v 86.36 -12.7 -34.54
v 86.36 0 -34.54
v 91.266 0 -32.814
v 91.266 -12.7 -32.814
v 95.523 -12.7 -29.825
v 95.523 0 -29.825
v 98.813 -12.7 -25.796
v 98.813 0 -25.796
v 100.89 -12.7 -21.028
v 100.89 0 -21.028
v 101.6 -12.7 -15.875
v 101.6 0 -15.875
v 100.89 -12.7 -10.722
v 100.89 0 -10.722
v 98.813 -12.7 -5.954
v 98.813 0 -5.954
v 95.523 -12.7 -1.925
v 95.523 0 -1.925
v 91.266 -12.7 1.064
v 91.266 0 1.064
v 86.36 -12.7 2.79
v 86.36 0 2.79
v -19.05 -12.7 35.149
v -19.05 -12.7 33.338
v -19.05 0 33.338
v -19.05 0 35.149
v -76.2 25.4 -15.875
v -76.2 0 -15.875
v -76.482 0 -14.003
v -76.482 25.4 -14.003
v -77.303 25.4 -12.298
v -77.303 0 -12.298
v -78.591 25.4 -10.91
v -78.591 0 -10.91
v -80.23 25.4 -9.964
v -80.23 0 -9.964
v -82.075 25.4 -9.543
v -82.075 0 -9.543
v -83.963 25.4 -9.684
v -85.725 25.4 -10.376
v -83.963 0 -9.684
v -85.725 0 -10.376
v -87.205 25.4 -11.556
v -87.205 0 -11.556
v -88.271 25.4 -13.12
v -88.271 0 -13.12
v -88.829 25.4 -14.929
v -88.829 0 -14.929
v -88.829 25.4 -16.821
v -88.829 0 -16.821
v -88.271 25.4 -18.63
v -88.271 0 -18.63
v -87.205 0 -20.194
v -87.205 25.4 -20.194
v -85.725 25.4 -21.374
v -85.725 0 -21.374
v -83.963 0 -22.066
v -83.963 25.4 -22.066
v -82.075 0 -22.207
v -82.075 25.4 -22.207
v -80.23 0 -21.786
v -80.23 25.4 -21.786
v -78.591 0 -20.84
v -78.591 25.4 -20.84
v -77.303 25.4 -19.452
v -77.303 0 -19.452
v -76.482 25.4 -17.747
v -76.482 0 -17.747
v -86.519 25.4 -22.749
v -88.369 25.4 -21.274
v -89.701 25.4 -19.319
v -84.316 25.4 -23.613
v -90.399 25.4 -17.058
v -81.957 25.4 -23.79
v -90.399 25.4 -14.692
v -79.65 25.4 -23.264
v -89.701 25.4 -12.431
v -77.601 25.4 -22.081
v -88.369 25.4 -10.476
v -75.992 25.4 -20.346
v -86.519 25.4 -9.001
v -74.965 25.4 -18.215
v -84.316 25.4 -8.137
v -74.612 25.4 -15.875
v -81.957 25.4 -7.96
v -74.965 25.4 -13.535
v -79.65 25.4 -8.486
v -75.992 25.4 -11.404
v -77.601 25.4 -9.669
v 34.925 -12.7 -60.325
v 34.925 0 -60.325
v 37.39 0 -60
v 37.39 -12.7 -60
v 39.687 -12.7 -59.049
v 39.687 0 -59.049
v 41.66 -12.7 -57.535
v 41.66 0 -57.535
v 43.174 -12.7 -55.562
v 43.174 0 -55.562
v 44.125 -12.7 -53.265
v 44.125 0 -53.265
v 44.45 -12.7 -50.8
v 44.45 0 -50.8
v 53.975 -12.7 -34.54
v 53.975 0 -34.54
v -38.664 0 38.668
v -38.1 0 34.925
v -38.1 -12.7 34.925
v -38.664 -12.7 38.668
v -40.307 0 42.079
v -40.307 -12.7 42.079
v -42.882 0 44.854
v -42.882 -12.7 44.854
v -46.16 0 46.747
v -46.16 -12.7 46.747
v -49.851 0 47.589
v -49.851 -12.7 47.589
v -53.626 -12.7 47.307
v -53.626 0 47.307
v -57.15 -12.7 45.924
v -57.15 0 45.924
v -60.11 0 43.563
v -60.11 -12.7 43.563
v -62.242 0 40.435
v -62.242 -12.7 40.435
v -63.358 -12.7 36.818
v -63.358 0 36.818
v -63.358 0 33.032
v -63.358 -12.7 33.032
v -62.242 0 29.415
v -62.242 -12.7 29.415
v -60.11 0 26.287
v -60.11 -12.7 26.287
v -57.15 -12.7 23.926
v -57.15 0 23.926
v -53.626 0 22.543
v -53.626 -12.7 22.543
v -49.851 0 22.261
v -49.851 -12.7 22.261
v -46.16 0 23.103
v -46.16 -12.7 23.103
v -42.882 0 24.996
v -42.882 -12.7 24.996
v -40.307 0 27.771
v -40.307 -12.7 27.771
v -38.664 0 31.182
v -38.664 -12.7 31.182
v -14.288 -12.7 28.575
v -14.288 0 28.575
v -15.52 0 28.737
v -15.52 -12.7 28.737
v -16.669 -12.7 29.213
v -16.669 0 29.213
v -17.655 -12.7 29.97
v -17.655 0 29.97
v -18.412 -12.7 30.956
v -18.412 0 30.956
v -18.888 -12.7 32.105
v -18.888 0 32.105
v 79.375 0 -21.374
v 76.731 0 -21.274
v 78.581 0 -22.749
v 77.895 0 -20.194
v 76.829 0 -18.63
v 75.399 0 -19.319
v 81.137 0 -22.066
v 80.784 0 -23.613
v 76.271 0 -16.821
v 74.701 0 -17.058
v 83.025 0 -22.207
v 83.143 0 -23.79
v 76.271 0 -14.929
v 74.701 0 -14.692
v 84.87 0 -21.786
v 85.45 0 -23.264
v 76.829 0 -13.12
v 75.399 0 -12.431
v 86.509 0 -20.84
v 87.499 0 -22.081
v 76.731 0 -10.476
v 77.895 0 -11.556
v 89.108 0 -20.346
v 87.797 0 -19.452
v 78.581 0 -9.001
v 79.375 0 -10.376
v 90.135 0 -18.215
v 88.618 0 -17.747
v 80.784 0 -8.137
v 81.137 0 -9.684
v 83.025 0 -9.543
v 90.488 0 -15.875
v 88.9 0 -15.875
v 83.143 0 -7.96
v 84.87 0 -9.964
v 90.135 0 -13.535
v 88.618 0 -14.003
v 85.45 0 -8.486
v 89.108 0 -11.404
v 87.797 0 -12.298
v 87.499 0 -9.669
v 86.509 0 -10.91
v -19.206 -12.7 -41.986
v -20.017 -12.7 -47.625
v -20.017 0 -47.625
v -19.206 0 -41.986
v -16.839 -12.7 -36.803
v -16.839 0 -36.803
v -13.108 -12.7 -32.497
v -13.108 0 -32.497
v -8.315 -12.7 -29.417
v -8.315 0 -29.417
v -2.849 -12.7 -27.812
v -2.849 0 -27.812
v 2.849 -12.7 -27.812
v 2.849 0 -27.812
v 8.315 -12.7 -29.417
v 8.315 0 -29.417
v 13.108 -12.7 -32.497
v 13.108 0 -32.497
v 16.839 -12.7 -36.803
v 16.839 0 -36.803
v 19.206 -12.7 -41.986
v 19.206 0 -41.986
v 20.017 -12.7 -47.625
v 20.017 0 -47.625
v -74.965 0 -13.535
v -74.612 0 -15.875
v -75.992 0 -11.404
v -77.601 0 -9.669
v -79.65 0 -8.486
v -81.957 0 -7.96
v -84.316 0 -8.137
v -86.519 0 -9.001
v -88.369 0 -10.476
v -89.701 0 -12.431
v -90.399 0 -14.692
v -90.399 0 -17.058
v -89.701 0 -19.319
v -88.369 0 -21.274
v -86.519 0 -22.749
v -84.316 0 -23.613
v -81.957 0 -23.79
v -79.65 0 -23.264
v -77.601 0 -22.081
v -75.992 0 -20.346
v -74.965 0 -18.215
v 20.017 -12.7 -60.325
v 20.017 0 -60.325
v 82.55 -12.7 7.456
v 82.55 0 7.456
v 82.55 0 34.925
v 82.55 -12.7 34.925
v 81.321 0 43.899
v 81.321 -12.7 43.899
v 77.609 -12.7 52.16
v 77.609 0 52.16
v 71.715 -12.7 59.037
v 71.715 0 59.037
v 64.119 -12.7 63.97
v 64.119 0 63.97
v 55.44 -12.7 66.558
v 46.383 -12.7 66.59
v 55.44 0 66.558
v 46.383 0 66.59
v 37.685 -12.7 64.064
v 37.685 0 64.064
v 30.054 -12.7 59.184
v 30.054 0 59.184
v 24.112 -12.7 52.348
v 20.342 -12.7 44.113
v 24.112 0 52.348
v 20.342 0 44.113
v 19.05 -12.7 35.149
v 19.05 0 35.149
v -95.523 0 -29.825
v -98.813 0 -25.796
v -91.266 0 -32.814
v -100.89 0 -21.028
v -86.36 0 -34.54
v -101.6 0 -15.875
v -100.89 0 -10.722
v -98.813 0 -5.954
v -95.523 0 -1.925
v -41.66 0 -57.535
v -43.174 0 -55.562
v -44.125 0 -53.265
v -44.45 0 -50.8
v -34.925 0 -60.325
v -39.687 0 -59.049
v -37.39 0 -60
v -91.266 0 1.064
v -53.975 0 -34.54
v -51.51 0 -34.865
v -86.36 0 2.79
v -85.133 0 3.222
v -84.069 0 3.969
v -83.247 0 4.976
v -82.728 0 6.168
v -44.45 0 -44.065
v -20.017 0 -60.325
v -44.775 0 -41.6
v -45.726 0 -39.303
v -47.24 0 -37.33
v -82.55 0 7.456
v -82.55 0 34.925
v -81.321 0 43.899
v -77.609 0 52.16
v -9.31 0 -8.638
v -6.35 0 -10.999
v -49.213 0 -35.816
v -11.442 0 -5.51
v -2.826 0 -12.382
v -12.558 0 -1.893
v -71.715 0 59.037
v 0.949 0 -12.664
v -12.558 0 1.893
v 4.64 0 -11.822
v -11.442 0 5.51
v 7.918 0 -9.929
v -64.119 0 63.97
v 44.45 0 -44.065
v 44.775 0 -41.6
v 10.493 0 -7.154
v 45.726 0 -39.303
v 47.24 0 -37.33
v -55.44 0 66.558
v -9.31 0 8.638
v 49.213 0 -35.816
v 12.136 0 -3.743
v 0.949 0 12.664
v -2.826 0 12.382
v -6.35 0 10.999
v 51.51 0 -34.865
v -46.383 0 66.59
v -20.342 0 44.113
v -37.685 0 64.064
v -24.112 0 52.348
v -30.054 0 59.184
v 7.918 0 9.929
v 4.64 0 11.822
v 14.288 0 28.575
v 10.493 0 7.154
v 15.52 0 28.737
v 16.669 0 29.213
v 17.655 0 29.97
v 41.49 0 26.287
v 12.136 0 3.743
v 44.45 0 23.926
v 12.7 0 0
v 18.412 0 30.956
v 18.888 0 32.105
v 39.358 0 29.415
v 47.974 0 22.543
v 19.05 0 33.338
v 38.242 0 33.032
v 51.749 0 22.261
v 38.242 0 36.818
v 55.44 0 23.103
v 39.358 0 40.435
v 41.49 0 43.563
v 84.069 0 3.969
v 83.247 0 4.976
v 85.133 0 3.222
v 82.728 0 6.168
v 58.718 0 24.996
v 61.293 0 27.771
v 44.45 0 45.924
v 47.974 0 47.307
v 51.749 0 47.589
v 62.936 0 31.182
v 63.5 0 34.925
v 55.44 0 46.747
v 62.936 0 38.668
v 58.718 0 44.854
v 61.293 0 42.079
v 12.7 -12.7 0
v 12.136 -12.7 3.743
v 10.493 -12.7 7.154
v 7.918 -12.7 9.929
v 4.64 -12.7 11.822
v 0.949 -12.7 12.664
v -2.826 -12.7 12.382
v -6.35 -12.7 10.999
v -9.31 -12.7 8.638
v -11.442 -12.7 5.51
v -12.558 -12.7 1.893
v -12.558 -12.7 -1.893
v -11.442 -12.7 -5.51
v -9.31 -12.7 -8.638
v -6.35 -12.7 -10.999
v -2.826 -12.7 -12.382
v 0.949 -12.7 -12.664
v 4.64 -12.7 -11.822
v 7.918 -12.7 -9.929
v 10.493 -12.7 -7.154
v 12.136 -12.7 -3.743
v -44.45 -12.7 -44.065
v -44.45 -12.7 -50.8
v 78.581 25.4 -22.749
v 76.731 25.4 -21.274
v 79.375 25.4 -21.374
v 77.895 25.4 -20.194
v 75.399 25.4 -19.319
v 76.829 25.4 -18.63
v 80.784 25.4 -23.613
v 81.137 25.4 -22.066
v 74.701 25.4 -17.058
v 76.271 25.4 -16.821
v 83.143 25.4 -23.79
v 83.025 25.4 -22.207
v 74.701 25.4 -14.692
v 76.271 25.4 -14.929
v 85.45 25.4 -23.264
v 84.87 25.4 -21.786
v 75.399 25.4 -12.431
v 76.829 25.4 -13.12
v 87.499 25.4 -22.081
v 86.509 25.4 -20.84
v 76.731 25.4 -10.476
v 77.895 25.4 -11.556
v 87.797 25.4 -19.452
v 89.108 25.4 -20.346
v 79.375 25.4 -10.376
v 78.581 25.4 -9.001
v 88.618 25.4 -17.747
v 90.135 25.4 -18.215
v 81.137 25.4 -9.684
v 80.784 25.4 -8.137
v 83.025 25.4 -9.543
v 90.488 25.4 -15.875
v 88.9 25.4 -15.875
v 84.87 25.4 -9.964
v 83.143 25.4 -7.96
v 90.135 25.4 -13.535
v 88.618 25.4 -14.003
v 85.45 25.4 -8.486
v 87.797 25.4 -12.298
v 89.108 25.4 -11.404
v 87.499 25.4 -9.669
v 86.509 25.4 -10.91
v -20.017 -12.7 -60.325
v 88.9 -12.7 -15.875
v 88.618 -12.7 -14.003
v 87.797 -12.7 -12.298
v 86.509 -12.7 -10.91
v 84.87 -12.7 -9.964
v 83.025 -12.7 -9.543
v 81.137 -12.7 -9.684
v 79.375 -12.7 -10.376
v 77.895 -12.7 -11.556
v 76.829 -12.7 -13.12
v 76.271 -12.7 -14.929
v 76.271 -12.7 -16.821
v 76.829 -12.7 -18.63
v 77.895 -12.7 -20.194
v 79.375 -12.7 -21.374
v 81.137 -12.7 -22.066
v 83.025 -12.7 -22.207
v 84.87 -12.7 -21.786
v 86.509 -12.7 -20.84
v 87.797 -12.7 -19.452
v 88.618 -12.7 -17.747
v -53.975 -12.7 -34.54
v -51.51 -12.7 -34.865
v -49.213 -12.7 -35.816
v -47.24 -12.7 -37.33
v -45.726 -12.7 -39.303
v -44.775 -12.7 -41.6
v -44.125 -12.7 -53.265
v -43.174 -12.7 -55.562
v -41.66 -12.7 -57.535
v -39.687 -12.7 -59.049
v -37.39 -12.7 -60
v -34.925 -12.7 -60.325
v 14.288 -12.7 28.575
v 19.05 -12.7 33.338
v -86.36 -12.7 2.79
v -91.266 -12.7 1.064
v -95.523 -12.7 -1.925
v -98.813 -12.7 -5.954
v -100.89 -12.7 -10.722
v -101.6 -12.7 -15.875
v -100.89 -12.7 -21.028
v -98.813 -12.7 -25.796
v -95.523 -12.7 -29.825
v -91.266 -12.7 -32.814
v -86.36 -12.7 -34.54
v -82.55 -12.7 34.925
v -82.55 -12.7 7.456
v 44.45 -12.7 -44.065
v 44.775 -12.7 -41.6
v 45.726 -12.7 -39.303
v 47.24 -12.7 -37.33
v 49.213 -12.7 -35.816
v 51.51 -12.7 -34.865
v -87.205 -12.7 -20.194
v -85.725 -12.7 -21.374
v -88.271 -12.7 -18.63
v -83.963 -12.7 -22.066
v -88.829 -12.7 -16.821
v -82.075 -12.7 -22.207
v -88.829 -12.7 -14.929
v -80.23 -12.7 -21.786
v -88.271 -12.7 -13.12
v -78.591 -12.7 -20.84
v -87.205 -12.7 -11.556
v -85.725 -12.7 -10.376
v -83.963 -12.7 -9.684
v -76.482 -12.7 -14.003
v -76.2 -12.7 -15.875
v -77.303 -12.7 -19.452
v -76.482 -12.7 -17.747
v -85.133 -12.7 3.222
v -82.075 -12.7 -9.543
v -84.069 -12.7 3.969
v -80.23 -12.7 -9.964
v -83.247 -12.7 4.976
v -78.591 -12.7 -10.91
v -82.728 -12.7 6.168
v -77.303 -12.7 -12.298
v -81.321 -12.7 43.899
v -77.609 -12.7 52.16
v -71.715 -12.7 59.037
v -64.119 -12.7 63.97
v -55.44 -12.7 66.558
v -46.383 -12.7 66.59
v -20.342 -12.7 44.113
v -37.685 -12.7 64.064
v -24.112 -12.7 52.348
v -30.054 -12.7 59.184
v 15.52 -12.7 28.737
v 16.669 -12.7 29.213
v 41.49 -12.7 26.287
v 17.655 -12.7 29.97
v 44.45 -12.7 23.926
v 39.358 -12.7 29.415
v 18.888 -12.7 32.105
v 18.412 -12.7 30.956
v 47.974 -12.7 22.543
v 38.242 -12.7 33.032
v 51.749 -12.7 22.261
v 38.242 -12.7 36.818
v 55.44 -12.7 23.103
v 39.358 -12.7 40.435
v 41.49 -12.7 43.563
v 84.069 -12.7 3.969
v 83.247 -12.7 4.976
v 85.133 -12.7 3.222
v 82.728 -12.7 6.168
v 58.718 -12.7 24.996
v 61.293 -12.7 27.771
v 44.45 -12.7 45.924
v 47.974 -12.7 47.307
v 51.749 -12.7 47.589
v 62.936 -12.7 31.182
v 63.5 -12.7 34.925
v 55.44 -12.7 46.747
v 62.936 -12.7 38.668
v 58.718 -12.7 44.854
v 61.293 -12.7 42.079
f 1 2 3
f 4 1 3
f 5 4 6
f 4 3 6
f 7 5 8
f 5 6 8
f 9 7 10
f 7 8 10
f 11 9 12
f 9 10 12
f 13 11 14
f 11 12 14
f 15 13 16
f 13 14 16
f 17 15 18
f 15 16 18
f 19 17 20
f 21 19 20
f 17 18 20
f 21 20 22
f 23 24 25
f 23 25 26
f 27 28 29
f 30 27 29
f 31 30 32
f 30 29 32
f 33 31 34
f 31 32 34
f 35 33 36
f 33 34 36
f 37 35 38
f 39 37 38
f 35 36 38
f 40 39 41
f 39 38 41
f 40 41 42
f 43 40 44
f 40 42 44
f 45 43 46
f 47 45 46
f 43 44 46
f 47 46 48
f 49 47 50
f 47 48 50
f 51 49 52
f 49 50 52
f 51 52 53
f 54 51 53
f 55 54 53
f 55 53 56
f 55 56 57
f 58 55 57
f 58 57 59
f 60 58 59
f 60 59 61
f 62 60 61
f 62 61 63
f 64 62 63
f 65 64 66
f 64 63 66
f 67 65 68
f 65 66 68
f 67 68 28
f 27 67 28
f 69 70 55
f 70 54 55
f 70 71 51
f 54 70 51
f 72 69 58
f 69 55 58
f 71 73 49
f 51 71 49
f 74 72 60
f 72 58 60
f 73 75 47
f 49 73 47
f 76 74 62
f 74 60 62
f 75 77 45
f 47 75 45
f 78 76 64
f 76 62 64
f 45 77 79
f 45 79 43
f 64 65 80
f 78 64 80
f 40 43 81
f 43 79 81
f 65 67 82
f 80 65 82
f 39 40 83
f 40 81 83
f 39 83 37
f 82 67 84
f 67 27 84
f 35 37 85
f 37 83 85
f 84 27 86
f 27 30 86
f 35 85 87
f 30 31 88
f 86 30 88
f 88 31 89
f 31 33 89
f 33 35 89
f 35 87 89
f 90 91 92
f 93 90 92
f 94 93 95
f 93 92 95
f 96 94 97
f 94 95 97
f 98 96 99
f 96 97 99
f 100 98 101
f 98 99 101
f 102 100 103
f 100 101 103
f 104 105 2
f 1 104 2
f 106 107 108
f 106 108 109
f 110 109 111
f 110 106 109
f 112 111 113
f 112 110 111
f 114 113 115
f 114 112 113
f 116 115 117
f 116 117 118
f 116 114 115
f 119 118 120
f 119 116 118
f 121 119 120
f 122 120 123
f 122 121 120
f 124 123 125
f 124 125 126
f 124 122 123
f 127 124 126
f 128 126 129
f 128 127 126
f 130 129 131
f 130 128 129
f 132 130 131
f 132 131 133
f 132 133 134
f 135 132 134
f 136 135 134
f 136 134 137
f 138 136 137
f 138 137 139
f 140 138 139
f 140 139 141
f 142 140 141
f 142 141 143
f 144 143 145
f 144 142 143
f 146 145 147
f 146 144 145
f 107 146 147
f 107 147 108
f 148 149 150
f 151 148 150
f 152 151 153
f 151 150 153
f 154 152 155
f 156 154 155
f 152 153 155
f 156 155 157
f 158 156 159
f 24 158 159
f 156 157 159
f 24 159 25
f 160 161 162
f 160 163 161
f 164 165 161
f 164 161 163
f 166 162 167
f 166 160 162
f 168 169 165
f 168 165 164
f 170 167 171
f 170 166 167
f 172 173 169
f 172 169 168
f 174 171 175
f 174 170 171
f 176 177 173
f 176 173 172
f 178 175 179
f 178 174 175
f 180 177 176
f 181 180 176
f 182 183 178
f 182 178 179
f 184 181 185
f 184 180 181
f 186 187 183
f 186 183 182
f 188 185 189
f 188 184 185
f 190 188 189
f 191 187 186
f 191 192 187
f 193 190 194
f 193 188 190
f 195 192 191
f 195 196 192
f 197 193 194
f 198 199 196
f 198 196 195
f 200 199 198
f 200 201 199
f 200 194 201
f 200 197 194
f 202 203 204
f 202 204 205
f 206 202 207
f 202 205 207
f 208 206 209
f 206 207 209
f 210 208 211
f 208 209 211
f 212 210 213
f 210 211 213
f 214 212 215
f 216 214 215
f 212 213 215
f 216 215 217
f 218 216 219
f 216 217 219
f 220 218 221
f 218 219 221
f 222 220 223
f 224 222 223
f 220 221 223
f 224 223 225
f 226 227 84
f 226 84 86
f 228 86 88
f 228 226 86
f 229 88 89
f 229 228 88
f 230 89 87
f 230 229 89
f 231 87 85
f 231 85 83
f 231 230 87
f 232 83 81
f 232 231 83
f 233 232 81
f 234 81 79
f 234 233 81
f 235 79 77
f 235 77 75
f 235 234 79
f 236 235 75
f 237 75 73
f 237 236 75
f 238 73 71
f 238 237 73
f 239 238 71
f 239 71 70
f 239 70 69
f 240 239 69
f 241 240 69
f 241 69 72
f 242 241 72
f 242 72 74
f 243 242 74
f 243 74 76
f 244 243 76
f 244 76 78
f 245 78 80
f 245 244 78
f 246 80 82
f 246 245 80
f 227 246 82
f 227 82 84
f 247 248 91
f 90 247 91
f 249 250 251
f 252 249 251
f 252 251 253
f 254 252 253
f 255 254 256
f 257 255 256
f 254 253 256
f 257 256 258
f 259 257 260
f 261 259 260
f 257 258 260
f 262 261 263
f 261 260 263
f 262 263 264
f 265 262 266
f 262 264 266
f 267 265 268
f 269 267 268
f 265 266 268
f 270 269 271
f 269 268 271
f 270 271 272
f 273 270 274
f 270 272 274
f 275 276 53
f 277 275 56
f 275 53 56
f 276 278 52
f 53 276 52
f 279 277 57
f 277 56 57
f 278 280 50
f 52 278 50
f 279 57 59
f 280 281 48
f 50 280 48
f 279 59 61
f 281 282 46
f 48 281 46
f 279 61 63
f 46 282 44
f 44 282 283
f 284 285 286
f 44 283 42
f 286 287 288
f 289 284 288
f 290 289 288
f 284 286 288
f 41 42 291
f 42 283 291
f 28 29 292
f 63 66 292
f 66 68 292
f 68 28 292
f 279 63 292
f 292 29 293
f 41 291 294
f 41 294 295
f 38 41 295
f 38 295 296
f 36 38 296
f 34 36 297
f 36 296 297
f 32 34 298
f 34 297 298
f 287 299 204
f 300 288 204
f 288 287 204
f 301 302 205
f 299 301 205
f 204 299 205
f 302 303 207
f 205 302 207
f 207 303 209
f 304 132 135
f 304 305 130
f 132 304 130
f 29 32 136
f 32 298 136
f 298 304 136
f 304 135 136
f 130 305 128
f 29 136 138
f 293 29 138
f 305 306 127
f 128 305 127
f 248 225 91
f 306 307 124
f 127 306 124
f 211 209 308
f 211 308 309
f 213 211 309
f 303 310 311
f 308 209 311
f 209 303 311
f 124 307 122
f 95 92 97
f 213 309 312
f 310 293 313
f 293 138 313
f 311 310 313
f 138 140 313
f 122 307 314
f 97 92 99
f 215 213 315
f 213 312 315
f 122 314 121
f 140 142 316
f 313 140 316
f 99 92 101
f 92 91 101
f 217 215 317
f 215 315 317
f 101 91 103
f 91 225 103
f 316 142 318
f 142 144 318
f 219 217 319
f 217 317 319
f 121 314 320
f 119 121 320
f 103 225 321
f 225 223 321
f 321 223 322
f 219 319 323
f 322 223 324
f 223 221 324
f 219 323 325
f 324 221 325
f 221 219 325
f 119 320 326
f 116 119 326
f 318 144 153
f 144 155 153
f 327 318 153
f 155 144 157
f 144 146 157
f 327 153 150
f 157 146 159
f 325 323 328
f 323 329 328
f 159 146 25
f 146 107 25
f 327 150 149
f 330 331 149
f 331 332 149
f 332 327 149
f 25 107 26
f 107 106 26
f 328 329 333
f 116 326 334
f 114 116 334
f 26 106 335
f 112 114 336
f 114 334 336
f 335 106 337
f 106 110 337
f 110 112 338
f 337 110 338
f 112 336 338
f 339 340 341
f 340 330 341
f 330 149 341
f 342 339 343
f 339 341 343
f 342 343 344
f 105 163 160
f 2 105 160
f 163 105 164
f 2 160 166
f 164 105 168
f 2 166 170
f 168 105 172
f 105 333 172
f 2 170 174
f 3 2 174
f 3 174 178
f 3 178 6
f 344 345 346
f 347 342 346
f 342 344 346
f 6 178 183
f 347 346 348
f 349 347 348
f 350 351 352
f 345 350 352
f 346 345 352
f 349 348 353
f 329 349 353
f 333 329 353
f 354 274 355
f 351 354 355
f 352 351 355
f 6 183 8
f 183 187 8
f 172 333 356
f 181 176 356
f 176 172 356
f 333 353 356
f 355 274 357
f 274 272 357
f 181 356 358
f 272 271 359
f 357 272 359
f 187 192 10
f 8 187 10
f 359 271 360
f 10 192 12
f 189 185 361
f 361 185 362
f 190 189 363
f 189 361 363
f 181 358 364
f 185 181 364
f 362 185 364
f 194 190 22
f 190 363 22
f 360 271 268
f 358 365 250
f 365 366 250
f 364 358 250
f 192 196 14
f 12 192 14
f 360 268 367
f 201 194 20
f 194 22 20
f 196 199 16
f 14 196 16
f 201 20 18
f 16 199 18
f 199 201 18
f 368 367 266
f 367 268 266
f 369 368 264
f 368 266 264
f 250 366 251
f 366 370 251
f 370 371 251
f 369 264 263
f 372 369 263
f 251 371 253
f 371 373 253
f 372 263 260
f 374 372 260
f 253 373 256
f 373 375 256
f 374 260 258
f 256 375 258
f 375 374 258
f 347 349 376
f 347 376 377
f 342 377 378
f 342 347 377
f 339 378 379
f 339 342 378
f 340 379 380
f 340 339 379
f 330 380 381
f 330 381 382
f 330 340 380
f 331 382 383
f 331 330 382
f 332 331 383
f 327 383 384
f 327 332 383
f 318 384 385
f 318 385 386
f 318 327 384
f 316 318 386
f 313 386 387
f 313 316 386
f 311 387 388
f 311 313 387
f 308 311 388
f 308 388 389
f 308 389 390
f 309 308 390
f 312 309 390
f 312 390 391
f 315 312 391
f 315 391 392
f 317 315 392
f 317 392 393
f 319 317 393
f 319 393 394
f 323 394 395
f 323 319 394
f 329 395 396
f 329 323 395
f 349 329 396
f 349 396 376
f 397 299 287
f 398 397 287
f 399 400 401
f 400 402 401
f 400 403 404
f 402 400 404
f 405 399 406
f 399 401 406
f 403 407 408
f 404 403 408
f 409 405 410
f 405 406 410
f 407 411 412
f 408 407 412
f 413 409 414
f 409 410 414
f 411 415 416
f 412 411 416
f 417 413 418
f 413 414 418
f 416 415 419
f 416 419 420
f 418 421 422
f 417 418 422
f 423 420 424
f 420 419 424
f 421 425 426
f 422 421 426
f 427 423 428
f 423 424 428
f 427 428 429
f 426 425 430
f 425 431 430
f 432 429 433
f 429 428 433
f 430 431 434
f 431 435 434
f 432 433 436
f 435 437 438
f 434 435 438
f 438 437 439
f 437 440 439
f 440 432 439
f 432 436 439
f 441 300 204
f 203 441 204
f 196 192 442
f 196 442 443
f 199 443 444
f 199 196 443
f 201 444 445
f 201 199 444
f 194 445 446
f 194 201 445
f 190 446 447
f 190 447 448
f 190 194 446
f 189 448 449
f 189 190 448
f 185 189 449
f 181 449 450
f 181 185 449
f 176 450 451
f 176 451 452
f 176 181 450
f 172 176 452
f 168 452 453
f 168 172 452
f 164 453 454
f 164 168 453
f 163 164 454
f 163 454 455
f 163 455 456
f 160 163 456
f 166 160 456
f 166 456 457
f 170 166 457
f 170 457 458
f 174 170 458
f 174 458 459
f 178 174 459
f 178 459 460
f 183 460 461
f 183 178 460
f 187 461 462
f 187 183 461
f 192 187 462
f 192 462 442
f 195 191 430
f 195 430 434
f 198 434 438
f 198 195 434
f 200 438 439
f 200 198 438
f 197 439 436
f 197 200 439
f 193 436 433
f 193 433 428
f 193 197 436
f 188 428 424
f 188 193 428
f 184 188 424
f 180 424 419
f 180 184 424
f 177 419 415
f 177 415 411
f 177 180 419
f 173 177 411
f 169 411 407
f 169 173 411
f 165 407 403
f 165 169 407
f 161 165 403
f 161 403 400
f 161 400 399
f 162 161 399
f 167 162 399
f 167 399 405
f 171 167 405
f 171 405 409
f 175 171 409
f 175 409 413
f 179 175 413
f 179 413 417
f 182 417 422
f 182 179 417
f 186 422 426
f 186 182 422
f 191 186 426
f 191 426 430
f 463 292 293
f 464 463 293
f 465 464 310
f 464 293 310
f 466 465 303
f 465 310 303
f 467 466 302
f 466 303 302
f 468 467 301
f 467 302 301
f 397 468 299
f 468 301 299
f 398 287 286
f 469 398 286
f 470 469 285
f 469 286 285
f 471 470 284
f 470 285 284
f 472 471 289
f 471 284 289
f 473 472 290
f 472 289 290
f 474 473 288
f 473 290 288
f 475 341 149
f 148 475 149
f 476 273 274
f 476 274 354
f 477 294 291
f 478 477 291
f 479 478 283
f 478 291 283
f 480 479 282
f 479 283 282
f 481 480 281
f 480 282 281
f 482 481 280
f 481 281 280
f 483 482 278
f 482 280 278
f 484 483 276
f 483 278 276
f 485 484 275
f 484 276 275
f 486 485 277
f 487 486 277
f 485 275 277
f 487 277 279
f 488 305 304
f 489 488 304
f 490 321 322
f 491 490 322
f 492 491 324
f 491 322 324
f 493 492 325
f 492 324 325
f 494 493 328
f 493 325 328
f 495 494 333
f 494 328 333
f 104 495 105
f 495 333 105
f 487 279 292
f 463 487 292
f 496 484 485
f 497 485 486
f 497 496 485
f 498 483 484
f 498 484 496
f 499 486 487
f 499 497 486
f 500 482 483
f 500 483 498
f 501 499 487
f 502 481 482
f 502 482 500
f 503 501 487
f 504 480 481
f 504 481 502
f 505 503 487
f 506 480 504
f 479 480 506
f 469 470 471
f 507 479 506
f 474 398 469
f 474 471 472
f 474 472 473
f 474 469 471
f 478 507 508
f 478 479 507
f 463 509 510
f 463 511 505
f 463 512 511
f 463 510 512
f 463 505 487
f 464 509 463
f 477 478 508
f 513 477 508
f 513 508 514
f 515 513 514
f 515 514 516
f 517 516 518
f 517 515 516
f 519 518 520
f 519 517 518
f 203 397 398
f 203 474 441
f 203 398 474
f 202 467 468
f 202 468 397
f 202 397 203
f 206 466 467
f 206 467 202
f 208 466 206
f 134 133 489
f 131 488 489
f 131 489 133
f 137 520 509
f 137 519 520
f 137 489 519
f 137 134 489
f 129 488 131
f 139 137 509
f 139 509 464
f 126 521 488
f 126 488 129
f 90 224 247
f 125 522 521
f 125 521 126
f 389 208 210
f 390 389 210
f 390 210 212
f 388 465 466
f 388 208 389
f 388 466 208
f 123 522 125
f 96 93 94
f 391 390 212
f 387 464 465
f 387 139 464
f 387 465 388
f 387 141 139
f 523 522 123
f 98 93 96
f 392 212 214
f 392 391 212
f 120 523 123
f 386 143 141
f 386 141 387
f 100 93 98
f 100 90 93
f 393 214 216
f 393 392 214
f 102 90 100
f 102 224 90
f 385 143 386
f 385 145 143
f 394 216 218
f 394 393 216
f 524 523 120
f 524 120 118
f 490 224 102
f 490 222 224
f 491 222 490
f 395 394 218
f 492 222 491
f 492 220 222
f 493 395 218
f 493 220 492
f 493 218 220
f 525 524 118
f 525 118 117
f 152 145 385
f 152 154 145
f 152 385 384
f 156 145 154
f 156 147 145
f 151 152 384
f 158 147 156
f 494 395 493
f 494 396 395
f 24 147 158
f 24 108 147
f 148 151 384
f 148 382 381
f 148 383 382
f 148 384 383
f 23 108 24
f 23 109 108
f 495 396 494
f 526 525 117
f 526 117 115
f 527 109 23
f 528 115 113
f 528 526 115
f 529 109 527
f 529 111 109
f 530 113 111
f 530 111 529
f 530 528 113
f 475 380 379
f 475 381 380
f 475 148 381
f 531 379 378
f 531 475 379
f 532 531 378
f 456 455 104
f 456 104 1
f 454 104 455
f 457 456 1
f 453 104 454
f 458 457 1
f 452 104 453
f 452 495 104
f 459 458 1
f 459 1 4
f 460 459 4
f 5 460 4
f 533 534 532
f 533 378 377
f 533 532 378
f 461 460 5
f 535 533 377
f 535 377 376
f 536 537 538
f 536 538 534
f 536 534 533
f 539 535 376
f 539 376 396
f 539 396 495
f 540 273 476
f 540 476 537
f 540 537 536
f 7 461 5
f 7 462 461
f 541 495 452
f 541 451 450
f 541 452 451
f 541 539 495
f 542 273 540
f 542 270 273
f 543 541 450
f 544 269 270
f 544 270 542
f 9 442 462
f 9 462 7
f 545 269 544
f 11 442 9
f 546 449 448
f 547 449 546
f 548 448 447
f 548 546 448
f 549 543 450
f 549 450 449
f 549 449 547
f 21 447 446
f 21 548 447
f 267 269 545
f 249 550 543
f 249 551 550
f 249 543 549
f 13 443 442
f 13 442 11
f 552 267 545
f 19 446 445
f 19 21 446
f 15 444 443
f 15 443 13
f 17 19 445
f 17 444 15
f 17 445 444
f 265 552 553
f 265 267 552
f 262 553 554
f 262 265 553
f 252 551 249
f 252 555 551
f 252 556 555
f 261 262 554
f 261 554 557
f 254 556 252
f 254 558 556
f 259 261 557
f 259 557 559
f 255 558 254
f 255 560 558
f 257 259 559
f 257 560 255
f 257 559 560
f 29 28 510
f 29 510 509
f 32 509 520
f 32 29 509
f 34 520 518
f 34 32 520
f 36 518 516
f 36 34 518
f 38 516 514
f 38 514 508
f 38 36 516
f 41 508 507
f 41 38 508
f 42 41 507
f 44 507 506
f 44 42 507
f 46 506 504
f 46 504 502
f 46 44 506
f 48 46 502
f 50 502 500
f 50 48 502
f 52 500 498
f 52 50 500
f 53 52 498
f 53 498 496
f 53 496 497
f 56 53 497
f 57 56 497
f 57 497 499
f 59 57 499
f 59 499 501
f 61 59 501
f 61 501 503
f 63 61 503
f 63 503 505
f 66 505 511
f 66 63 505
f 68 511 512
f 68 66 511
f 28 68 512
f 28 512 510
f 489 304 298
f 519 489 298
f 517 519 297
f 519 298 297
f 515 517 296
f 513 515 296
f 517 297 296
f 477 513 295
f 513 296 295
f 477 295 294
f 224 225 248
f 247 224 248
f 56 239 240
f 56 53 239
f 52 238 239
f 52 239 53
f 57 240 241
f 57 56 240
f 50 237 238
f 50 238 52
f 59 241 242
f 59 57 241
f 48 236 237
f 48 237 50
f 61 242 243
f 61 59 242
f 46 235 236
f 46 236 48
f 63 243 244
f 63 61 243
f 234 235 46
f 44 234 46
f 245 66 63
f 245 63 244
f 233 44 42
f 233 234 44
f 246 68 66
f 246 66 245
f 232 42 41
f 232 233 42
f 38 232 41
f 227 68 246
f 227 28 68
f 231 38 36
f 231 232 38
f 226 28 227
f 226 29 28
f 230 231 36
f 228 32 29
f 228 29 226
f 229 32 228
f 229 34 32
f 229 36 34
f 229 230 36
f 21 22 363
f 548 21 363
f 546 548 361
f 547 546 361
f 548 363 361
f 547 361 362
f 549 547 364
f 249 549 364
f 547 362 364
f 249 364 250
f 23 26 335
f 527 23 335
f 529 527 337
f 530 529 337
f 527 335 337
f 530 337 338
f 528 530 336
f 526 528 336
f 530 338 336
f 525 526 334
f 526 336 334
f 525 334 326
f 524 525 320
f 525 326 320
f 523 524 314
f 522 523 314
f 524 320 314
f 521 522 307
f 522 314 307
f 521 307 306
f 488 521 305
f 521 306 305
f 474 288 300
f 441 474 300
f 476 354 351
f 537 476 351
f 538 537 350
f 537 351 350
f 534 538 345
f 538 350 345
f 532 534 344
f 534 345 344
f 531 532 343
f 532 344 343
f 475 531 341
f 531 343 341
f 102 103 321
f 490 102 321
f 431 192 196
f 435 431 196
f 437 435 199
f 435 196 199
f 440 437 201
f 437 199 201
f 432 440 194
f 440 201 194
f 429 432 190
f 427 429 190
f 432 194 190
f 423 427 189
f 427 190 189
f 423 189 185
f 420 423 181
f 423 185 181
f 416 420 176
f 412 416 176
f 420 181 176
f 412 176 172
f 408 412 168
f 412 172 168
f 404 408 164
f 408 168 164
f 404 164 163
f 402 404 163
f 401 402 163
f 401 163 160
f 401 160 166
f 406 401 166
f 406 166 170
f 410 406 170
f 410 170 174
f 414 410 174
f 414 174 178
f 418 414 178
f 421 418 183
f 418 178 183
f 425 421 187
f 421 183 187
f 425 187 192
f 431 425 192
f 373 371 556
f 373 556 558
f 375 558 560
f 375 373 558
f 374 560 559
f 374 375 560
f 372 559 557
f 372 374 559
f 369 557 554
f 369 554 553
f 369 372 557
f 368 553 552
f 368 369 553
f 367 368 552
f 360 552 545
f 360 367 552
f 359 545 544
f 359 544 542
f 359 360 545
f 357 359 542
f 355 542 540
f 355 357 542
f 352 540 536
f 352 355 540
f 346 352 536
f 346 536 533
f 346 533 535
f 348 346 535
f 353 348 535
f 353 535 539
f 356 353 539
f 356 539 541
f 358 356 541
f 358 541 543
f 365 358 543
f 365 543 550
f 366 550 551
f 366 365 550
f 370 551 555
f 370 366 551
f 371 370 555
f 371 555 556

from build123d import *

# Parameters (mm, degrees)
F0_R     = 7.9375
F0_R_2   = 12.7
F0_R_3   = 6.35
F1_DEPTH = 12.7
F2_DEPTH = 25.4


with BuildPart() as f1:
    # F0 (on Front) → F1 (new body)
    with BuildSketch(Plane.XZ):
        with BuildLine():
            Line((14.2875, 28.575), (-14.2875, 28.575))
            ThreePointArc((-14.2875, 28.575), (-17.655096, 29.969904), (-19.05, 33.3375))
            Line((-19.05, 33.3375), (-19.05, 35.148678))
            ThreePointArc((-19.05, 35.148678), (-50.912234, 66.898875), (-82.55, 34.925))
            Line((-82.55, 34.925), (-82.55, 7.45639))
            ThreePointArc((-82.55, 7.45639), (-83.623483, 4.44432), (-86.36, 2.790112))
            ThreePointArc((-86.36, 2.790112), (-101.6, -15.875), (-86.36, -34.540112))
            Line((-86.36, -34.540112), (-82.55, -34.540112))
            Line((-82.55, -34.540112), (-53.975, -34.540112))
            ThreePointArc((-53.975, -34.540112), (-47.239808, -37.32992), (-44.45, -44.065112))
            Line((-44.45, -44.065112), (-44.45, -50.8))
            ThreePointArc((-44.45, -50.8), (-41.660192, -57.535192), (-34.925, -60.325))
            Line((-34.925, -60.325), (-20.016928, -60.325))
            Line((-20.016928, -60.325), (-20.016928, -47.625))
            ThreePointArc((-20.016928, -47.625), (0, -27.608072), (20.016928, -47.625))
            Line((20.016928, -47.625), (20.016928, -60.325))
            Line((20.016928, -60.325), (34.925, -60.325))
            ThreePointArc((34.925, -60.325), (41.660192, -57.535192), (44.45, -50.8))
            Line((44.45, -50.8), (44.45, -44.065112))
            ThreePointArc((44.45, -44.065112), (47.239808, -37.32992), (53.975, -34.540112))
            Line((53.975, -34.540112), (82.55, -34.540112))
            Line((82.55, -34.540112), (86.36, -34.540112))
            ThreePointArc((86.36, -34.540112), (101.6, -15.875), (86.36, 2.790112))
            ThreePointArc((86.36, 2.790112), (83.623483, 4.44432), (82.55, 7.45639))
            Line((82.55, 7.45639), (82.55, 34.925))
            ThreePointArc((82.55, 34.925), (50.912234, 66.898875), (19.05, 35.148678))
            Line((19.05, 35.148678), (19.05, 33.3375))
            ThreePointArc((19.05, 33.3375), (17.655096, 29.969904), (14.2875, 28.575))
        make_face()
        with Locations((-82.55, -15.875)):
            Circle(F0_R, mode=Mode.SUBTRACT)
        Circle(F0_R_2, mode=Mode.SUBTRACT)
        with Locations((82.55, -15.875)):
            Circle(F0_R, mode=Mode.SUBTRACT)
        with Locations((-50.8, 34.925)):
            Circle(F0_R_2, mode=Mode.SUBTRACT)
        with Locations((50.8, 34.925)):
            Circle(F0_R_2, mode=Mode.SUBTRACT)
        with Locations((82.55, -15.875)):
            Circle(F0_R)
        with Locations((82.55, -15.875)):
            Circle(F0_R_3, mode=Mode.SUBTRACT)
        with Locations((-82.55, -15.875)):
            Circle(F0_R)
        with Locations((-82.55, -15.875)):
            Circle(F0_R_3, mode=Mode.SUBTRACT)
    extrude(amount=F1_DEPTH)


with BuildPart() as f2:
    # F0 (on Front) → F2 (new body)
    with BuildSketch(Plane.XZ):
        with Locations((-82.55, -15.875)):
            Circle(F0_R)
        with Locations((-82.55, -15.875)):
            Circle(F0_R_3, mode=Mode.SUBTRACT)
        with Locations((82.55, -15.875)):
            Circle(F0_R)
        with Locations((82.55, -15.875)):
            Circle(F0_R_3, mode=Mode.SUBTRACT)
    extrude(amount=-F2_DEPTH)


solid = Compound([f1.part, f2.part])
